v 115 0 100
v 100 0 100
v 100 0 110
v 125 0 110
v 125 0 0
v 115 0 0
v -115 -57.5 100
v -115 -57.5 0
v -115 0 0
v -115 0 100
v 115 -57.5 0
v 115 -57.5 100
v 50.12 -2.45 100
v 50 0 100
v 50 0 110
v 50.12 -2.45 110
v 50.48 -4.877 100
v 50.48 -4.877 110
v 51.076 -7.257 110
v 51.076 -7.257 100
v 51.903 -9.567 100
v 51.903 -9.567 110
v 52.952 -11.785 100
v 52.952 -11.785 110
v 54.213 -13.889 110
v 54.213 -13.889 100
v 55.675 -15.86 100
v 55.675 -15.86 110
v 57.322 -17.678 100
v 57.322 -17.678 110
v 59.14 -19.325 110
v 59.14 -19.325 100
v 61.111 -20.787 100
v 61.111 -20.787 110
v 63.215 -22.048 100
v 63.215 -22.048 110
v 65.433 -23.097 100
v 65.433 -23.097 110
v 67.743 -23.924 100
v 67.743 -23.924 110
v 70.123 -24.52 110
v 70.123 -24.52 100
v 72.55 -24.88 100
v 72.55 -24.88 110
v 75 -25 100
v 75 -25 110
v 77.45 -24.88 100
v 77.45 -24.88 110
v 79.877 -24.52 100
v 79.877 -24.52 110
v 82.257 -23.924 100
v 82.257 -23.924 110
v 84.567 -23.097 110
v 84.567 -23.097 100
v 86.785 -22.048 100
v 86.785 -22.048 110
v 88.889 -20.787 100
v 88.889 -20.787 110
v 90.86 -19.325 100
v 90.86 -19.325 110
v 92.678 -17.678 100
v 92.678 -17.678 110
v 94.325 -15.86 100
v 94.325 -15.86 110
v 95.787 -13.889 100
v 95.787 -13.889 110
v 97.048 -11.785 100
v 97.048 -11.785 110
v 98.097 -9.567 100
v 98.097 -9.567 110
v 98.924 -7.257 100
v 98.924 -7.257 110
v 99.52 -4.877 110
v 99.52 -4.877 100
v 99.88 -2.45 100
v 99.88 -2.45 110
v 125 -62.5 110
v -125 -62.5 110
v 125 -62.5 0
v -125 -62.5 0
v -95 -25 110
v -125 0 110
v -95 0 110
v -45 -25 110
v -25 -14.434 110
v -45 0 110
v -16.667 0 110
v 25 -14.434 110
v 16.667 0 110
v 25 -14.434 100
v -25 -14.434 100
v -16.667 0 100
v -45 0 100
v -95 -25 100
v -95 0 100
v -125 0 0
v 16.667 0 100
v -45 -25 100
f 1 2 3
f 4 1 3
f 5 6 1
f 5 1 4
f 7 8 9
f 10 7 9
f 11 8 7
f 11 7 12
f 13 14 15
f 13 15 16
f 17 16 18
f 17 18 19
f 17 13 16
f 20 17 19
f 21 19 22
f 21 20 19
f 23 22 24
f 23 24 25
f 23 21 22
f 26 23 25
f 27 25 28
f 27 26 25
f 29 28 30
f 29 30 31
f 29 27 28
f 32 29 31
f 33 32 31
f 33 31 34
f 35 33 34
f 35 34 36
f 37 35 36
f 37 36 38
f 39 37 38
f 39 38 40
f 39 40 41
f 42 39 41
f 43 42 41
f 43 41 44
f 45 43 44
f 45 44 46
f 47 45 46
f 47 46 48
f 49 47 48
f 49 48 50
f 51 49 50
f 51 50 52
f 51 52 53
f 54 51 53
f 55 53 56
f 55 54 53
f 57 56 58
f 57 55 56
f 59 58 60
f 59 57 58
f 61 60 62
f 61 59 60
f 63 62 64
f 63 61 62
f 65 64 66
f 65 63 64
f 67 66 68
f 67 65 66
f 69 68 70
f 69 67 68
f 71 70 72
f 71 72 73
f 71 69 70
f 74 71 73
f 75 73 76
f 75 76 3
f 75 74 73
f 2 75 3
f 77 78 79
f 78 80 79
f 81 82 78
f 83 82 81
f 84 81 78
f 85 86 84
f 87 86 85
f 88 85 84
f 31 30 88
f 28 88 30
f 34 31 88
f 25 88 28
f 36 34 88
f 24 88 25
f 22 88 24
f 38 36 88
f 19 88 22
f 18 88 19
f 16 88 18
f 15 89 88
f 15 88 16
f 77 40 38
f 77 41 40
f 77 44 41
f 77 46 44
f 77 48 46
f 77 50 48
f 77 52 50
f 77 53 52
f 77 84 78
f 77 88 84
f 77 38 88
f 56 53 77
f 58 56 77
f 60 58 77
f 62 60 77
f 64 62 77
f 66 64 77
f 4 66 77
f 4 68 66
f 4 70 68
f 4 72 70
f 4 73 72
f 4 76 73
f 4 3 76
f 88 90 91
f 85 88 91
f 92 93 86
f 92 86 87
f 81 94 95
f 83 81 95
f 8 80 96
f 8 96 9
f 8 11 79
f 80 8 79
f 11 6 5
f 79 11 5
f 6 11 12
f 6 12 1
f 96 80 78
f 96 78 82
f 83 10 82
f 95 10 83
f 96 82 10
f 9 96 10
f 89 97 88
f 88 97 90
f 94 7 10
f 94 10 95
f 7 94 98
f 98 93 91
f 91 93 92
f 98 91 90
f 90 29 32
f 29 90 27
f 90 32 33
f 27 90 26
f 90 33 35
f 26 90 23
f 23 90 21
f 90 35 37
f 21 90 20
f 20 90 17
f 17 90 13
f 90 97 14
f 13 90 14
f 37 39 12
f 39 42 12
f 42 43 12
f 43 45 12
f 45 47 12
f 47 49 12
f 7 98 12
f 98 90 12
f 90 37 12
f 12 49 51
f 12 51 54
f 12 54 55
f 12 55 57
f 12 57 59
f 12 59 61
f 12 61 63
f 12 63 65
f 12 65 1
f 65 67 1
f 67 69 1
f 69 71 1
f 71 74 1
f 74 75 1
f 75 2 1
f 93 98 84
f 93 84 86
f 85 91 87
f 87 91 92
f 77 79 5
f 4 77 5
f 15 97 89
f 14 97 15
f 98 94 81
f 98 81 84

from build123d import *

# Parameters (mm, degrees)
SKETCH1_W               = 250
SKETCH1_H               = 125
SKETCH1_W_2             = 230
SKETCH1_H_2             = 115
BOSS_EXTRUDE1_DEPTH     = 100
SKETCH3_W               = 250
SKETCH3_H               = 125
SKETCH3_W_2             = 230
SKETCH3_H_2             = 115
SKETCH3_R               = 25
SKETCH3_W_3             = 50
SKETCH3_H_3             = 50
BOSS_EXTRUDE4_DEPTH     = 10
CUT_EXTRUDE1_DEPTH      = 178.851764118
CUT_EXTRUDE1_DEPTH_BACK = 178.851764118


with BuildPart() as part:
    # Sketch1 → Boss-Extrude1 (new body)
    with BuildSketch(Plane.XY):
        Rectangle(SKETCH1_W, SKETCH1_H)
        Rectangle(SKETCH1_W_2, SKETCH1_H_2, mode=Mode.SUBTRACT)
    extrude(amount=BOSS_EXTRUDE1_DEPTH)

    # Sketch3 → Boss-Extrude4 (add)
    # profile 1 of 2: a face of its own
    with BuildSketch(Plane.XY.offset(100)):
        Rectangle(SKETCH3_W, SKETCH3_H)
        Rectangle(SKETCH3_W_2, SKETCH3_H_2, mode=Mode.SUBTRACT)
    # profile 2 of 2: a face of its own
    with BuildSketch(Plane.XY.offset(100)):
        Rectangle(SKETCH3_W_2, SKETCH3_H_2)
        with Locations((75, 0)):
            Circle(SKETCH3_R, mode=Mode.SUBTRACT)
        with Locations((-70, 0)):
            Rectangle(SKETCH3_W_3, SKETCH3_H_3, mode=Mode.SUBTRACT)
        Polygon((0, 28.867513459), (25, -14.43375673), (-25, -14.43375673), align=None, mode=Mode.SUBTRACT)
    extrude(amount=BOSS_EXTRUDE4_DEPTH)

    # Sketch4 → Cut-Extrude1 (cut, two sides: drawn at the far end of the back side and taken through both)
    with BuildSketch(Plane.XY.offset(-CUT_EXTRUDE1_DEPTH_BACK)):
        Polygon((-709.844547741, 0), (-138.233831443, 0), (148.761573573, 0), (720.372289871, 0), (720.372289871, 1143.221432596), (-709.844547741, 1143.221432596), align=None)
    extrude(amount=CUT_EXTRUDE1_DEPTH + CUT_EXTRUDE1_DEPTH_BACK, mode=Mode.SUBTRACT)


solid = part.part
